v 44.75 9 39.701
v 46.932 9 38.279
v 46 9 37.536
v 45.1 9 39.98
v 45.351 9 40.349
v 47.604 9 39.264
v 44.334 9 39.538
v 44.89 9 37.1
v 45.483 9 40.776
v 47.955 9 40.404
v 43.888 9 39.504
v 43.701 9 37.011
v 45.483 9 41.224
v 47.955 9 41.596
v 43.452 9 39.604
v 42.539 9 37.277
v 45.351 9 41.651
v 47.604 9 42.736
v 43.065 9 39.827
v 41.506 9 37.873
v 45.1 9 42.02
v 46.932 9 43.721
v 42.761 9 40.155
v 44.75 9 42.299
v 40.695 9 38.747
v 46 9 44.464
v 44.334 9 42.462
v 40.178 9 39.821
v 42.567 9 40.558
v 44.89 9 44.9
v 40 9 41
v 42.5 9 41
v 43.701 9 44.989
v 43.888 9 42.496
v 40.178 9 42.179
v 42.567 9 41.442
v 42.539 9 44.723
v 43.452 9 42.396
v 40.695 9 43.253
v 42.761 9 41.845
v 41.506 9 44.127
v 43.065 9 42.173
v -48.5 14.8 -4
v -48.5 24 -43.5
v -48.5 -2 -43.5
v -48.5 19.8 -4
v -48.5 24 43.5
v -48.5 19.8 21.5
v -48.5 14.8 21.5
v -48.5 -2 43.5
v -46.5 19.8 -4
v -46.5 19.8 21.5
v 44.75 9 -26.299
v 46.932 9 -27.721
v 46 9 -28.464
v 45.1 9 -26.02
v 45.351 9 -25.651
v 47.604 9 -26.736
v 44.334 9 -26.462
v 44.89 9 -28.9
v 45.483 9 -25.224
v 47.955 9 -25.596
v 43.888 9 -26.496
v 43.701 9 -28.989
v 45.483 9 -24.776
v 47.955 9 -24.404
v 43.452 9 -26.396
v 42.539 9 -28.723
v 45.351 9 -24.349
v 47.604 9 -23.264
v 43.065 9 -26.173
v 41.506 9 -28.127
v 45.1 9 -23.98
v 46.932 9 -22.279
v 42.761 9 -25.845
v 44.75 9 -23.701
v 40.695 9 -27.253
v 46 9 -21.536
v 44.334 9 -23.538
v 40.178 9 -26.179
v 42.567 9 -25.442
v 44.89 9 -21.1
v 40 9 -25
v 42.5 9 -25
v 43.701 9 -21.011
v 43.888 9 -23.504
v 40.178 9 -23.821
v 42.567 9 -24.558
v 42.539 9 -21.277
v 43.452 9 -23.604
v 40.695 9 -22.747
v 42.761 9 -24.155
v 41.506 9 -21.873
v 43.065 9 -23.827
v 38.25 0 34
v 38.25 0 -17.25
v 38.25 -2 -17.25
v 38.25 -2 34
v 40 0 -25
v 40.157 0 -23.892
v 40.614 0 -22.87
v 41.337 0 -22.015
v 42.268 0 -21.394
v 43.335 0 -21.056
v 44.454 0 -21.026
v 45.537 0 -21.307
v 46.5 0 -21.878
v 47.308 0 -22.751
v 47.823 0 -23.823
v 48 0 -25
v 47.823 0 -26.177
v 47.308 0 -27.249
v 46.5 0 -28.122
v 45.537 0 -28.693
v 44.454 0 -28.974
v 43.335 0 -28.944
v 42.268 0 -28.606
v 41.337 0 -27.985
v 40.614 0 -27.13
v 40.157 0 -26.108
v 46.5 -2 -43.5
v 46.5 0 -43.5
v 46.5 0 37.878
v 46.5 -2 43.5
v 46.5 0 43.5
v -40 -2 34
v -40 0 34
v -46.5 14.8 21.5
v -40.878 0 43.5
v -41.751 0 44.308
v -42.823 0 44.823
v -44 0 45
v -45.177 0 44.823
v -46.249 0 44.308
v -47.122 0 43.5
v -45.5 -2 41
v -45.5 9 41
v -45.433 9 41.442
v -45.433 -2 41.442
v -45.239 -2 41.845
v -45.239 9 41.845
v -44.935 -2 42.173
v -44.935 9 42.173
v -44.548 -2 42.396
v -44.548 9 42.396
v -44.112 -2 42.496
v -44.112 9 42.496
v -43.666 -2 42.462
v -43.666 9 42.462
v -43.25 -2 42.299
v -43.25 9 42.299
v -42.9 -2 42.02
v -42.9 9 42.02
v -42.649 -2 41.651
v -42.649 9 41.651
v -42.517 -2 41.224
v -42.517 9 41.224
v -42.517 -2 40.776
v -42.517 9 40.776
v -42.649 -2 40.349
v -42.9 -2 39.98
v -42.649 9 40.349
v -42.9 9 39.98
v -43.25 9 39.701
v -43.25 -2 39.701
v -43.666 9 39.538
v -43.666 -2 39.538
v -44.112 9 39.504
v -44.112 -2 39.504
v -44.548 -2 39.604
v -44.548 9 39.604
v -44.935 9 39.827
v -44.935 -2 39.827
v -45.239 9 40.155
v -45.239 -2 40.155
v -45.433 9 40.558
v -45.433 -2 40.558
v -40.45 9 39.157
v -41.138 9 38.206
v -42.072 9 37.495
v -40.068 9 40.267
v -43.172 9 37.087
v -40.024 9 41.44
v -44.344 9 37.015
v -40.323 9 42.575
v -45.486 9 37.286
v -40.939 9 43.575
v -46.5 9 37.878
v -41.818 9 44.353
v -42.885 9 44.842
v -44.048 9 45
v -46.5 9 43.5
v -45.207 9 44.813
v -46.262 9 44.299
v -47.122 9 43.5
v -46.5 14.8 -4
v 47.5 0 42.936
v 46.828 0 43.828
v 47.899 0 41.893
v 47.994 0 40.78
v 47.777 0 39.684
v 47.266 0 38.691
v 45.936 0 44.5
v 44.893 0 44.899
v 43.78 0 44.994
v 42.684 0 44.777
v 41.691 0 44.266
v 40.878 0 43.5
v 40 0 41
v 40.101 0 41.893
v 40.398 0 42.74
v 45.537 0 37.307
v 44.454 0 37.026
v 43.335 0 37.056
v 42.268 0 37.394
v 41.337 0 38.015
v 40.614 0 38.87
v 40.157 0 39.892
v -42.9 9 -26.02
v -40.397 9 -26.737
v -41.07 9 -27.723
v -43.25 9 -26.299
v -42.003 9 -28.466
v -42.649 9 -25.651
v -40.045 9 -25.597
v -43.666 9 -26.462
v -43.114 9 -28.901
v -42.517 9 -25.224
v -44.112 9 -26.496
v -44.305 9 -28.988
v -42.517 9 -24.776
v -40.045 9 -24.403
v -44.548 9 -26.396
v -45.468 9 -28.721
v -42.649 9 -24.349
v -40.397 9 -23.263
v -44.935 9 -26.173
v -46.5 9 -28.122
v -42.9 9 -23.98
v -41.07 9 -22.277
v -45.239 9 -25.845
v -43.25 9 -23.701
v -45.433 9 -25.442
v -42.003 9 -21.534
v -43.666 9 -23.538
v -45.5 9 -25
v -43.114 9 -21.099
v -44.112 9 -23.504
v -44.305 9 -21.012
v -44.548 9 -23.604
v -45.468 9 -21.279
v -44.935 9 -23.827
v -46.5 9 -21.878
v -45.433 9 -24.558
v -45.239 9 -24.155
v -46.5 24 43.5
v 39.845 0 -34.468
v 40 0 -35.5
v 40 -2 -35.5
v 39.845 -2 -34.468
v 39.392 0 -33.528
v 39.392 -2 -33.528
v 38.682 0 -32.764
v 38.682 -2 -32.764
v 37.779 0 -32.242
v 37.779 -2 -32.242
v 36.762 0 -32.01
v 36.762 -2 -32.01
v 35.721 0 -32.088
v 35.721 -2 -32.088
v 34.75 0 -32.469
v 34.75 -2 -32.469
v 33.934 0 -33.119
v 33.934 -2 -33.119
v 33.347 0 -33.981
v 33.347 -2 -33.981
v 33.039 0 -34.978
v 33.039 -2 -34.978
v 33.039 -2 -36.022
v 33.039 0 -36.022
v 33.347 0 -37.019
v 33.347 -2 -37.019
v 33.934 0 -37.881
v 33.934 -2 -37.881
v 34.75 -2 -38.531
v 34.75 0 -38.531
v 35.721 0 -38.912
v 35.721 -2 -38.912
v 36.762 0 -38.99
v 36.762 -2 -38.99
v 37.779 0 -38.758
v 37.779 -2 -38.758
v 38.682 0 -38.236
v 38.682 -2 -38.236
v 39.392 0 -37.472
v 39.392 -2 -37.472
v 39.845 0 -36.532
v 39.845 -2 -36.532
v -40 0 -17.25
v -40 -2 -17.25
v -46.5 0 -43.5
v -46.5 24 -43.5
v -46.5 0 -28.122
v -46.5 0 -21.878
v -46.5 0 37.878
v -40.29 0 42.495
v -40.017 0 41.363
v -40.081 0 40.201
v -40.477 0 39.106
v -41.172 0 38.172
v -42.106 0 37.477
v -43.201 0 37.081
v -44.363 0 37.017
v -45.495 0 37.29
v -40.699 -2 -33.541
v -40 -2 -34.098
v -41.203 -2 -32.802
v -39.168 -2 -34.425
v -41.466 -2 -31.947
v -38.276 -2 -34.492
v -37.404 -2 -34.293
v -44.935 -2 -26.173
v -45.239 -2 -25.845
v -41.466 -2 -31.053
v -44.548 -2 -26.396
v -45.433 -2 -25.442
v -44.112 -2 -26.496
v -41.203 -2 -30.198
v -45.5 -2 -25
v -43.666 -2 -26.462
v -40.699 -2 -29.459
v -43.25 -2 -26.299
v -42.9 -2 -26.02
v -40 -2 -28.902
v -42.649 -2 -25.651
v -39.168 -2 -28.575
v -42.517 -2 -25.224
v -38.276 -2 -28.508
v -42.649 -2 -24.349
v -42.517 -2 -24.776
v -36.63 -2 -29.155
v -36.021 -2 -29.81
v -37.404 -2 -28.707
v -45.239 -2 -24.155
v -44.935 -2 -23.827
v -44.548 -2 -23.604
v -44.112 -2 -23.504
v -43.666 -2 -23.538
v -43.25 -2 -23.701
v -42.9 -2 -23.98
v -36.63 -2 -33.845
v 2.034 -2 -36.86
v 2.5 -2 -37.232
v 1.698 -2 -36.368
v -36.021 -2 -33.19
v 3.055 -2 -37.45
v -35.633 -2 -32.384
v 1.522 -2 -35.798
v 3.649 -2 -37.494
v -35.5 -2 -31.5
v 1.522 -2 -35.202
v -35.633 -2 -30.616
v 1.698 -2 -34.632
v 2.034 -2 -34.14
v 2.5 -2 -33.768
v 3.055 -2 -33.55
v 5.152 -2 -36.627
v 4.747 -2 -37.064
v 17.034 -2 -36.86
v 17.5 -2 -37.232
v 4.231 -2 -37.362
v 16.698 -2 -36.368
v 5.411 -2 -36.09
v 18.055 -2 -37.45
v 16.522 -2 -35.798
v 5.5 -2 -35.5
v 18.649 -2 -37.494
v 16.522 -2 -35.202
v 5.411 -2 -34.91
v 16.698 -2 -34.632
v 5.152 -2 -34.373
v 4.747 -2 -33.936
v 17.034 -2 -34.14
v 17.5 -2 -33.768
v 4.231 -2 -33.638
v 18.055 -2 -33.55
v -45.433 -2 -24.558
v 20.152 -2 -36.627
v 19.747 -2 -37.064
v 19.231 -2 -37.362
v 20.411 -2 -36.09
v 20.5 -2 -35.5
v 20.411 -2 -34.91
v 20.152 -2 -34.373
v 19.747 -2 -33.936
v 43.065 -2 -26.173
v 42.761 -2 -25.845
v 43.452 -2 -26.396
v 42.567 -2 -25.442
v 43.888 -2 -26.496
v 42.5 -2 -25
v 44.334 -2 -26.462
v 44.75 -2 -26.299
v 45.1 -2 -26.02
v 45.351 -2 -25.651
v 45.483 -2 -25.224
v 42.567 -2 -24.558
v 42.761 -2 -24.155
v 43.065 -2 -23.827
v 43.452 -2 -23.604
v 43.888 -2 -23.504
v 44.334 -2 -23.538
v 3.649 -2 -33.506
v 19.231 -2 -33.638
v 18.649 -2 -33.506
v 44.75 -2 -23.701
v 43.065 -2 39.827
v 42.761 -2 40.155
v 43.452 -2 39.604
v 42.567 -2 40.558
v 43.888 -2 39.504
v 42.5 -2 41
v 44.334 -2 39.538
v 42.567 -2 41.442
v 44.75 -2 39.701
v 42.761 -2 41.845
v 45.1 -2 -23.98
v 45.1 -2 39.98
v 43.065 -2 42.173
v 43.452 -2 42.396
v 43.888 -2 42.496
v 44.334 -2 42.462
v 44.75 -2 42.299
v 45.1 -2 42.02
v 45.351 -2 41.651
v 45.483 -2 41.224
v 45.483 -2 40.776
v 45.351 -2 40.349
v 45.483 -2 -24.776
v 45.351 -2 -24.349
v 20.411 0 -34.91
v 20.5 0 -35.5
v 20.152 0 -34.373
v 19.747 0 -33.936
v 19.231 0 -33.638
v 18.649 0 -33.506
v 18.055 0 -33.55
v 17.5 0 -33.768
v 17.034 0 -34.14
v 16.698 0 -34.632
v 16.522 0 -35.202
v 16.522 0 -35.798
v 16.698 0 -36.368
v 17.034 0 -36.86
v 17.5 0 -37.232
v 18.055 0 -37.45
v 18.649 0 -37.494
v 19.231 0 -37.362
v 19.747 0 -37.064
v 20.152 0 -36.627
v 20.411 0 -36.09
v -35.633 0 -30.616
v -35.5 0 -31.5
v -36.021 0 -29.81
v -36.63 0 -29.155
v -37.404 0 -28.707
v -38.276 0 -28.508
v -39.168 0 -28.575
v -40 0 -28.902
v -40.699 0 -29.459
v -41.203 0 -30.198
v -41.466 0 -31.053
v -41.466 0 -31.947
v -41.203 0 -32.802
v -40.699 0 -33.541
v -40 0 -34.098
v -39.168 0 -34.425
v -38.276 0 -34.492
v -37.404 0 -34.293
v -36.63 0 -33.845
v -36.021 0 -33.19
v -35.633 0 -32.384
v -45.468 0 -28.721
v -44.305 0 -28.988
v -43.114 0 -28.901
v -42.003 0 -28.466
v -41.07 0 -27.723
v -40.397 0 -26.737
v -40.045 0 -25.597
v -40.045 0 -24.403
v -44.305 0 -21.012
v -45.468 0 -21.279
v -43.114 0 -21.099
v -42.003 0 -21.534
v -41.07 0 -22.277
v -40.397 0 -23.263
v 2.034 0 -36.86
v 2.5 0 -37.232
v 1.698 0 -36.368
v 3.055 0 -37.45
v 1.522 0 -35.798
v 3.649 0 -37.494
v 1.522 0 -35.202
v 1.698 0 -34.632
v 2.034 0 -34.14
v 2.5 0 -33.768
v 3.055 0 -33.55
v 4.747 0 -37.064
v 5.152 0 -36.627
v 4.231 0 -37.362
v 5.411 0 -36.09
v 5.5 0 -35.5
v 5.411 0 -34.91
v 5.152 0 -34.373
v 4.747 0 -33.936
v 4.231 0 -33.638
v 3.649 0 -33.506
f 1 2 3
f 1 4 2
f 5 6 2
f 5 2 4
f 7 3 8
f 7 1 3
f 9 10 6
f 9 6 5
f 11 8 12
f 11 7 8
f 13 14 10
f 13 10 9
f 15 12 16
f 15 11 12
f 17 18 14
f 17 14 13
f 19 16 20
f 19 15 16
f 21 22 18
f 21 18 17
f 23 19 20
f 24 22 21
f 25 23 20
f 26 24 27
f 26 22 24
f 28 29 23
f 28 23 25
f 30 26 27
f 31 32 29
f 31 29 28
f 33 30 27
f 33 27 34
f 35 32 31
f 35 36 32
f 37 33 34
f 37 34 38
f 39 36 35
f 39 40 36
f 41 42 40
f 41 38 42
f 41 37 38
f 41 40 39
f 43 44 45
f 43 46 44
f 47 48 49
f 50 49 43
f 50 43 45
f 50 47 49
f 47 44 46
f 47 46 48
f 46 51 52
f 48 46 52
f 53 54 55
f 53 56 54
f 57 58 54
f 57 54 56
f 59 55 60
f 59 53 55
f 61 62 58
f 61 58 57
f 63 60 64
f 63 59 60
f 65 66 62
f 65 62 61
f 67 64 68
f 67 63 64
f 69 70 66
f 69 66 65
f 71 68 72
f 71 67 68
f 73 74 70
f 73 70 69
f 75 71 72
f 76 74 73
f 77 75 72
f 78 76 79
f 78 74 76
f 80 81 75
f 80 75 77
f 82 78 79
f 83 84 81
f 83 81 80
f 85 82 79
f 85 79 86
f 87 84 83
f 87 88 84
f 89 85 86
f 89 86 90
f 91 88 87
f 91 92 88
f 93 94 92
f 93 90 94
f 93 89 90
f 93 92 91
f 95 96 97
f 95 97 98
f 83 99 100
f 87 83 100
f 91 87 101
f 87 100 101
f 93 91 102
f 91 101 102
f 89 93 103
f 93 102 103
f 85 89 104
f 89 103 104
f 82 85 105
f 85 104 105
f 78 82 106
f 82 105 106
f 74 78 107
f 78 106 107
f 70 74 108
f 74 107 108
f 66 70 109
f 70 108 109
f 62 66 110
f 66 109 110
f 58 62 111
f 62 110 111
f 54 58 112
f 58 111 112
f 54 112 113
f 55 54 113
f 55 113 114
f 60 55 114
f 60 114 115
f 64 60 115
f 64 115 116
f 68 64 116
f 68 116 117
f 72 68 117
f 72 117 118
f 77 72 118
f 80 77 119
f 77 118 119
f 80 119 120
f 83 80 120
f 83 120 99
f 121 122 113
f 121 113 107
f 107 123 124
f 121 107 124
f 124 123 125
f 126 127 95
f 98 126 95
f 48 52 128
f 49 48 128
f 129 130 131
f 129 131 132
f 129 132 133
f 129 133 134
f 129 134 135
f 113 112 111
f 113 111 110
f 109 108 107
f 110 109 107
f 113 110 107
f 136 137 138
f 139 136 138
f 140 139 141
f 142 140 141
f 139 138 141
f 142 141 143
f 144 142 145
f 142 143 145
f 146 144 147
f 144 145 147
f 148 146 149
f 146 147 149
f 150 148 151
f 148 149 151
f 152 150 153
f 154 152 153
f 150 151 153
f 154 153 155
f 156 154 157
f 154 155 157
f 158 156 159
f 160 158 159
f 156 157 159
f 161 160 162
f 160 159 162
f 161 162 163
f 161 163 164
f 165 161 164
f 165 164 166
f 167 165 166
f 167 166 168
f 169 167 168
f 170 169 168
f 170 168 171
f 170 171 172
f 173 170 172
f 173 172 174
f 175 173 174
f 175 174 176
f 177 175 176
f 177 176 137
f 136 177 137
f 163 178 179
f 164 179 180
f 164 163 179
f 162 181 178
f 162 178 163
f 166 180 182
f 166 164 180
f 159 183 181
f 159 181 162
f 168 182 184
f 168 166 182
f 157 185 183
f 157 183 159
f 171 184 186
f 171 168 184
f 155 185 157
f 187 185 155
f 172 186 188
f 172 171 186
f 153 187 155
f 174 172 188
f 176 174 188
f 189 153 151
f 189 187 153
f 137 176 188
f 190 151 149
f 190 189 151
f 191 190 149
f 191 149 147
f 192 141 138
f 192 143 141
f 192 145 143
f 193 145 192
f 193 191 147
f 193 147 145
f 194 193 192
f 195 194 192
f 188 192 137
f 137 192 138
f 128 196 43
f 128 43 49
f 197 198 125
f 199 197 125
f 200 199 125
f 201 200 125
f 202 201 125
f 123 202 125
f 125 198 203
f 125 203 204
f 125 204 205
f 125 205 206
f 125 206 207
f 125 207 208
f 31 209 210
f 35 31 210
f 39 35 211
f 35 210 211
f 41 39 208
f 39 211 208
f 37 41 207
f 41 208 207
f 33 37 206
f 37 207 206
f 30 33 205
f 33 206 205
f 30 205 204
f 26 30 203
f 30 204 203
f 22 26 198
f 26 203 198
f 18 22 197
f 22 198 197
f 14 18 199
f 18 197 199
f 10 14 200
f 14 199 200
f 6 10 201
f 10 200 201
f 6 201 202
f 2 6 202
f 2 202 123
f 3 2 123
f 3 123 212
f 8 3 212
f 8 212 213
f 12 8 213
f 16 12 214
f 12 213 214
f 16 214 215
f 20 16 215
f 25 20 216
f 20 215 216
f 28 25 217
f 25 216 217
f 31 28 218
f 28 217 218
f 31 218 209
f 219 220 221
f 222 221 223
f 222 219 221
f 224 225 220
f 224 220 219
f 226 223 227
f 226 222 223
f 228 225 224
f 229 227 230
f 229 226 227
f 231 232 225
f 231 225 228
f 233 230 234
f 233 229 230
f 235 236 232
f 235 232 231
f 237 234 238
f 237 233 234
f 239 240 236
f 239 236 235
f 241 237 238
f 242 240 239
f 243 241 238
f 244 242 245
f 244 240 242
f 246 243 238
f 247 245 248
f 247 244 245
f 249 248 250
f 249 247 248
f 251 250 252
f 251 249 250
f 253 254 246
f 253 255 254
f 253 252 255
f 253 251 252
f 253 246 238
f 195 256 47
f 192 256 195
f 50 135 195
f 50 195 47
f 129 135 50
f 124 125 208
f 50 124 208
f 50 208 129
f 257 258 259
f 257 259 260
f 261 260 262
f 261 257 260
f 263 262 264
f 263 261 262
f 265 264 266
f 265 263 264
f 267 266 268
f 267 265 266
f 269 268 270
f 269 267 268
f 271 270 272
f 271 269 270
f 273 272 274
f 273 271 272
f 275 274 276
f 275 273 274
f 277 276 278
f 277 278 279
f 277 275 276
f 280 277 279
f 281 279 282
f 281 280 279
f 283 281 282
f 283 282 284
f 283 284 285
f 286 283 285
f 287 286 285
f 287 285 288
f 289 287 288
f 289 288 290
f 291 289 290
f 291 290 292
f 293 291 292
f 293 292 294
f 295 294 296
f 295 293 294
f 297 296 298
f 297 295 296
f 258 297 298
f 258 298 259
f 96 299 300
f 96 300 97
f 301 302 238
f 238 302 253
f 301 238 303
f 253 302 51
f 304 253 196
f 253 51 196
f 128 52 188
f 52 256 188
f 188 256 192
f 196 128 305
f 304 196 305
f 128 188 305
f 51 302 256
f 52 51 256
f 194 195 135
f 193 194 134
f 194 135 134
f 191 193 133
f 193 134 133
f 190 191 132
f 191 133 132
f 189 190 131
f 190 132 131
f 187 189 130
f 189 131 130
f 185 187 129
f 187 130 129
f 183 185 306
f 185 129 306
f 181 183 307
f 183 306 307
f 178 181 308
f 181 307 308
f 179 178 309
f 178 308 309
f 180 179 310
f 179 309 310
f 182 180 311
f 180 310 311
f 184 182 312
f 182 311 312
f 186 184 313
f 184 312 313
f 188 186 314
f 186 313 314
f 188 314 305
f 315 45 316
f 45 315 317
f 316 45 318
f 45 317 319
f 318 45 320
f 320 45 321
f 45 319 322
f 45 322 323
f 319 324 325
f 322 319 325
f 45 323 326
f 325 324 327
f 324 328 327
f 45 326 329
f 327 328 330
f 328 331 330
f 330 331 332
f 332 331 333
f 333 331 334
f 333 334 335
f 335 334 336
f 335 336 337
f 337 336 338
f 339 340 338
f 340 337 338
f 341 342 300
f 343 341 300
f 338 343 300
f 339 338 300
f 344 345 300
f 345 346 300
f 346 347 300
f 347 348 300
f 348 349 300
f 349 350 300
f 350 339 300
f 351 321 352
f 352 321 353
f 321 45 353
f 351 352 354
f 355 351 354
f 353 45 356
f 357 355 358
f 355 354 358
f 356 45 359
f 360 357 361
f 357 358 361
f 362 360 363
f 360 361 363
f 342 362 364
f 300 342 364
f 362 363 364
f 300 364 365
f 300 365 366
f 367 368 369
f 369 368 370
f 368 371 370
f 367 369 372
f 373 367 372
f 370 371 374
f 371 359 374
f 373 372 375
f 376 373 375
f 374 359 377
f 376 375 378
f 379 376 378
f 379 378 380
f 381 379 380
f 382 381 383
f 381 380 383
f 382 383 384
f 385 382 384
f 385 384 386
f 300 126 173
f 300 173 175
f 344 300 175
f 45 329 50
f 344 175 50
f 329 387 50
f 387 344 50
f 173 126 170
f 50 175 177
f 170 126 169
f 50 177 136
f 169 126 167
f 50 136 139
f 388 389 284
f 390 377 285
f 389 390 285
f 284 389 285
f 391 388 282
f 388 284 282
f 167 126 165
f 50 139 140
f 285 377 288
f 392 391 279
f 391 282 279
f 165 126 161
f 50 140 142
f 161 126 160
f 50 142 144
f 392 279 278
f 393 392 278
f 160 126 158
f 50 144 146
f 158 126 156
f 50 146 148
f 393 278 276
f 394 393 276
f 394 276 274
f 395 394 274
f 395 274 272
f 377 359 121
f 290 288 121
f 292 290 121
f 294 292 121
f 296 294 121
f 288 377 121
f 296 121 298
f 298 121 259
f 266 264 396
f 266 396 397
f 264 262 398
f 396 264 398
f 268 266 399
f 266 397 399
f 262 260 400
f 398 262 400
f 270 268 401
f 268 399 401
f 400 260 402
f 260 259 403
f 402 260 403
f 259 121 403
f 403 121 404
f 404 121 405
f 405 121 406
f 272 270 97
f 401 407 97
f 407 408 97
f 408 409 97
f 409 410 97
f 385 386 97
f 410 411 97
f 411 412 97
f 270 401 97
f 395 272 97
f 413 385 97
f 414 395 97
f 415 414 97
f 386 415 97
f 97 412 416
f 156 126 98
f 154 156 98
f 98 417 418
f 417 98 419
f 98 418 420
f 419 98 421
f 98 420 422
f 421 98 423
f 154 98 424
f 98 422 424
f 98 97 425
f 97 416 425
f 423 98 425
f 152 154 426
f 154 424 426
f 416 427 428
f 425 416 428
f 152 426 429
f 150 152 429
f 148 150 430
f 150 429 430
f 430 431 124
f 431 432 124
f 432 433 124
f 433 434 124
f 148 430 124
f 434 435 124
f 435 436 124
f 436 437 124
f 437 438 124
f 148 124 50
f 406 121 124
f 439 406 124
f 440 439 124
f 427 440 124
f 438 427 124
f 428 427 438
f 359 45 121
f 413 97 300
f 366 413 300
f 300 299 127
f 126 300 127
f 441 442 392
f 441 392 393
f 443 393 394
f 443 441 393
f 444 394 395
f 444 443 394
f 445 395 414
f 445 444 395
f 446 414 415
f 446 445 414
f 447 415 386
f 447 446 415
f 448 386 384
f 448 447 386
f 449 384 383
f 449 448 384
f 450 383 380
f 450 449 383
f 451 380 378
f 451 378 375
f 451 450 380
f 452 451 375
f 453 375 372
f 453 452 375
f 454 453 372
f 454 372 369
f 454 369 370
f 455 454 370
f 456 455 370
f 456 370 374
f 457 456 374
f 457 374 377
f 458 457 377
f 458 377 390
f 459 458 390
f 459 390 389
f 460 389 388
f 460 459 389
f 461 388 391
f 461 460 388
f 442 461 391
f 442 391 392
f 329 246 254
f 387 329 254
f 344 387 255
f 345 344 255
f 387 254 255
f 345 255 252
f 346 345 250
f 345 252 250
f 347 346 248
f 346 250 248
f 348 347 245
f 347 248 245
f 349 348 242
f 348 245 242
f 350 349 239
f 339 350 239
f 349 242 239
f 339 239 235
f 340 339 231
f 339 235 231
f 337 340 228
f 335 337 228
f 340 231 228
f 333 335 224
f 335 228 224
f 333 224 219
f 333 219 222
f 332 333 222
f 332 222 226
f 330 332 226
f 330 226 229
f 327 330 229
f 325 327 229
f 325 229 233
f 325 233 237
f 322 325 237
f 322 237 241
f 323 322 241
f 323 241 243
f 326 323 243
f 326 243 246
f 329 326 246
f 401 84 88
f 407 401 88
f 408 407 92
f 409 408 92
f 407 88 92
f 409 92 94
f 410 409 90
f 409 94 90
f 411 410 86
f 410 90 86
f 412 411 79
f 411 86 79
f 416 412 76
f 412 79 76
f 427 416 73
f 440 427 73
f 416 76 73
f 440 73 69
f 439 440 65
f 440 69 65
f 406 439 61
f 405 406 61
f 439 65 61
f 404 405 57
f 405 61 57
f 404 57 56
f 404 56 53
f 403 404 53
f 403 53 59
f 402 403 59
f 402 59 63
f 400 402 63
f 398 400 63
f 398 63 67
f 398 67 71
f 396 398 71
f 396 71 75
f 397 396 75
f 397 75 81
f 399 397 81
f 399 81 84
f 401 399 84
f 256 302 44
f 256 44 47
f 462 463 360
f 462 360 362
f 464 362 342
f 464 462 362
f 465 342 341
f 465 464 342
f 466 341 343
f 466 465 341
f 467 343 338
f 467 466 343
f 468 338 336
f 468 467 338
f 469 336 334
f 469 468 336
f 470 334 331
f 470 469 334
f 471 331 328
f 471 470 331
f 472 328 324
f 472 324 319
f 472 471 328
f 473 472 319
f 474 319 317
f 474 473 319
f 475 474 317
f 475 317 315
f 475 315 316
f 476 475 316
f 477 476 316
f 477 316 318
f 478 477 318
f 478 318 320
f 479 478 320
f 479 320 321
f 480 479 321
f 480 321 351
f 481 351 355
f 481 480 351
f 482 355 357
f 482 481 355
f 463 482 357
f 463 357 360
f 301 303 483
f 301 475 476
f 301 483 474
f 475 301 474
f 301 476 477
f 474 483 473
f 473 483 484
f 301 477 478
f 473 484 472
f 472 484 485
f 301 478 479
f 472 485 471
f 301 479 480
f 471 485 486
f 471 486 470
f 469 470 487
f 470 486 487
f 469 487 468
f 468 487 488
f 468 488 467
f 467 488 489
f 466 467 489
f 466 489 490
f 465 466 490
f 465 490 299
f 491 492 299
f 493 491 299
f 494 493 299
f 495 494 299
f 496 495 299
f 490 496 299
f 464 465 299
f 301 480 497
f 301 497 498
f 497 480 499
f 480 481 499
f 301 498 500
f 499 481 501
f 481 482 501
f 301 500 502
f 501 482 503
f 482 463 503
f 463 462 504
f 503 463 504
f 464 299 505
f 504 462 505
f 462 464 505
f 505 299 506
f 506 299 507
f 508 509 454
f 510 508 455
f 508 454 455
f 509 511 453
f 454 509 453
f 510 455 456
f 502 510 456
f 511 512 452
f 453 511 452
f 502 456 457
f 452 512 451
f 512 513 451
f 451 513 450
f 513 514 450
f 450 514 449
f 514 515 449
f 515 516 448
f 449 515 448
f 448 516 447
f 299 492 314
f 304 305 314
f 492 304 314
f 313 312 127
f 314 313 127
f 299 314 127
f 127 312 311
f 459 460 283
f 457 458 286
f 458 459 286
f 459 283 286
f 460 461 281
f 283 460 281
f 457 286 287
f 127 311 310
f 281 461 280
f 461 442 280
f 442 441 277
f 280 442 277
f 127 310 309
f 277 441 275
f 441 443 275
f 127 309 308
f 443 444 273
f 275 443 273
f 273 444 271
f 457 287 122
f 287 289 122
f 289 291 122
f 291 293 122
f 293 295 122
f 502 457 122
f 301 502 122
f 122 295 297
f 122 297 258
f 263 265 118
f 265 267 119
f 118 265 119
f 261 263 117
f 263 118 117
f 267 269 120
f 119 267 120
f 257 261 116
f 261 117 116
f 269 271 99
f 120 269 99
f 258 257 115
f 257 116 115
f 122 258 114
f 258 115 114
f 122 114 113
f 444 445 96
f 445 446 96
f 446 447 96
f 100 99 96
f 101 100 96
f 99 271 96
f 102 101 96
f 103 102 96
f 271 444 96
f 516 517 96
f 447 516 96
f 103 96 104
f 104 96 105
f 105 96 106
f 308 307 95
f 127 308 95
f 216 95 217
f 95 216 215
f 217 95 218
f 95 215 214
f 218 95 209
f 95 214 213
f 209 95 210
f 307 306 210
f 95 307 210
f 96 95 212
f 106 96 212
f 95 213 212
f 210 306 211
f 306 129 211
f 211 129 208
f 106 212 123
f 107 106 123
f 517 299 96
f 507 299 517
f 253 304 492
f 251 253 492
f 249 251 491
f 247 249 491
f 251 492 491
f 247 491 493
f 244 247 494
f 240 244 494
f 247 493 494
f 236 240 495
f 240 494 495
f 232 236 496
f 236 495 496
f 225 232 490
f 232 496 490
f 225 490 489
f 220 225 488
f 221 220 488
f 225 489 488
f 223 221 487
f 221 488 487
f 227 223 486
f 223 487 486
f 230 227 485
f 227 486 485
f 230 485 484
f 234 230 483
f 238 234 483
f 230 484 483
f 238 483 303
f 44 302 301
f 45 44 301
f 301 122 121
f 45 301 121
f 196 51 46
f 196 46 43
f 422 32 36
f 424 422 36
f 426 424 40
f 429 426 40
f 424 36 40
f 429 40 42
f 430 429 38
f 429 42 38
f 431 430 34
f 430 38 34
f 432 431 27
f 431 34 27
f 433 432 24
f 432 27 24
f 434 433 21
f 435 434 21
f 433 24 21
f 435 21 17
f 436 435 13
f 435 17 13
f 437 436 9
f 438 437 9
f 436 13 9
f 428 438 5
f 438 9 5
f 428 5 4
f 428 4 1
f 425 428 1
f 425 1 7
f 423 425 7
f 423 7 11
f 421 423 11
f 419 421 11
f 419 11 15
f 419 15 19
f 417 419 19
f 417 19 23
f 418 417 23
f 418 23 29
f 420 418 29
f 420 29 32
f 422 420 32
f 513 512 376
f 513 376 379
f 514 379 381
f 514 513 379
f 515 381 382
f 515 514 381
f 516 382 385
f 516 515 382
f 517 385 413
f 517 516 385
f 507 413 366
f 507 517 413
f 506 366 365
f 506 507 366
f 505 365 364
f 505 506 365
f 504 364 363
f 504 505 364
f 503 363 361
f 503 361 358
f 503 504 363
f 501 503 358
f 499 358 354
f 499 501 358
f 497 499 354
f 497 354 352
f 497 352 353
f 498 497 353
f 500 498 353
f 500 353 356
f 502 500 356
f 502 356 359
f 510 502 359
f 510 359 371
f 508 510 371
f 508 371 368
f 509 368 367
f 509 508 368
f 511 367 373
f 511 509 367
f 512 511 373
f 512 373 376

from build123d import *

# Parameters (mm, degrees)
F0_W     = 93
F0_H     = 87
F0_R     = 3
F0_R_2   = 2
F0_R_3   = 3.5
F0_W_2   = 78.25
F0_H_2   = 51.25
F1_DEPTH = 2
F2_R     = 4
F3_DEPTH = 9
F4_R     = 1.5
F5_DEPTH = 25
F6_W     = 26
F6_H     = 87
F6_W_2   = 5
F6_H_2   = 25.5
F7_DEPTH = 2


# Not quite as in the source:
# - a feature of the source that left no trace in its solid (it failed there, or was rolled back) is left out


with BuildPart() as f1:
    # F0 (on Front) → F1 (new body)
    with BuildSketch(Plane.XZ):
        Rectangle(F0_W, F0_H)
        with Locations((-38.5, -31.5)):
            Circle(F0_R, mode=Mode.SUBTRACT)
        with Locations((3.5, -35.5)):
            Circle(F0_R_2, mode=Mode.SUBTRACT)
        with Locations((18.5, -35.5)):
            Circle(F0_R_2, mode=Mode.SUBTRACT)
        with Locations((36.5, -35.5)):
            Circle(F0_R_3, mode=Mode.SUBTRACT)
        with Locations((-0.875, 8.375)):
            Rectangle(F0_W_2, F0_H_2, mode=Mode.SUBTRACT)
    extrude(amount=F1_DEPTH)

    # F2 (on face) → F3 (join)
    with BuildSketch(Plane(origin=(0, 0, 0), x_dir=(-1, 0, 0), z_dir=(0, 1, 0))):
        with Locations((-44, 41)):
            Circle(F2_R)
        with Locations((44, 41)):
            Circle(F2_R)
        with Locations((44, -25)):
            Circle(F2_R)
        with Locations((-44, -25)):
            Circle(F2_R)
    extrude(amount=F3_DEPTH)

    # F4 (on face) → F5 (cut)
    with BuildSketch(Plane(origin=(0, 9, 0), x_dir=(-1, 0, 0), z_dir=(0, 1, 0))):
        with Locations((-44, 41)):
            Circle(F4_R)
        with Locations((44, 41)):
            Circle(F4_R)
        with Locations((44, -25)):
            Circle(F4_R)
        with Locations((-44, -25)):
            Circle(F4_R)
    extrude(amount=-F5_DEPTH, mode=Mode.SUBTRACT)

    # F6 (on face) → F7 (join)
    with BuildSketch(Plane(origin=(-46.5, 0, 0), x_dir=(0, -1, 0), z_dir=(-1, 0, 0))):
        with Locations((-11, 0)):
            Rectangle(F6_W, F6_H)
        with Locations((-17.3, 8.75)):
            Rectangle(F6_W_2, F6_H_2, mode=Mode.SUBTRACT)
    extrude(amount=F7_DEPTH)


solid = f1.part
